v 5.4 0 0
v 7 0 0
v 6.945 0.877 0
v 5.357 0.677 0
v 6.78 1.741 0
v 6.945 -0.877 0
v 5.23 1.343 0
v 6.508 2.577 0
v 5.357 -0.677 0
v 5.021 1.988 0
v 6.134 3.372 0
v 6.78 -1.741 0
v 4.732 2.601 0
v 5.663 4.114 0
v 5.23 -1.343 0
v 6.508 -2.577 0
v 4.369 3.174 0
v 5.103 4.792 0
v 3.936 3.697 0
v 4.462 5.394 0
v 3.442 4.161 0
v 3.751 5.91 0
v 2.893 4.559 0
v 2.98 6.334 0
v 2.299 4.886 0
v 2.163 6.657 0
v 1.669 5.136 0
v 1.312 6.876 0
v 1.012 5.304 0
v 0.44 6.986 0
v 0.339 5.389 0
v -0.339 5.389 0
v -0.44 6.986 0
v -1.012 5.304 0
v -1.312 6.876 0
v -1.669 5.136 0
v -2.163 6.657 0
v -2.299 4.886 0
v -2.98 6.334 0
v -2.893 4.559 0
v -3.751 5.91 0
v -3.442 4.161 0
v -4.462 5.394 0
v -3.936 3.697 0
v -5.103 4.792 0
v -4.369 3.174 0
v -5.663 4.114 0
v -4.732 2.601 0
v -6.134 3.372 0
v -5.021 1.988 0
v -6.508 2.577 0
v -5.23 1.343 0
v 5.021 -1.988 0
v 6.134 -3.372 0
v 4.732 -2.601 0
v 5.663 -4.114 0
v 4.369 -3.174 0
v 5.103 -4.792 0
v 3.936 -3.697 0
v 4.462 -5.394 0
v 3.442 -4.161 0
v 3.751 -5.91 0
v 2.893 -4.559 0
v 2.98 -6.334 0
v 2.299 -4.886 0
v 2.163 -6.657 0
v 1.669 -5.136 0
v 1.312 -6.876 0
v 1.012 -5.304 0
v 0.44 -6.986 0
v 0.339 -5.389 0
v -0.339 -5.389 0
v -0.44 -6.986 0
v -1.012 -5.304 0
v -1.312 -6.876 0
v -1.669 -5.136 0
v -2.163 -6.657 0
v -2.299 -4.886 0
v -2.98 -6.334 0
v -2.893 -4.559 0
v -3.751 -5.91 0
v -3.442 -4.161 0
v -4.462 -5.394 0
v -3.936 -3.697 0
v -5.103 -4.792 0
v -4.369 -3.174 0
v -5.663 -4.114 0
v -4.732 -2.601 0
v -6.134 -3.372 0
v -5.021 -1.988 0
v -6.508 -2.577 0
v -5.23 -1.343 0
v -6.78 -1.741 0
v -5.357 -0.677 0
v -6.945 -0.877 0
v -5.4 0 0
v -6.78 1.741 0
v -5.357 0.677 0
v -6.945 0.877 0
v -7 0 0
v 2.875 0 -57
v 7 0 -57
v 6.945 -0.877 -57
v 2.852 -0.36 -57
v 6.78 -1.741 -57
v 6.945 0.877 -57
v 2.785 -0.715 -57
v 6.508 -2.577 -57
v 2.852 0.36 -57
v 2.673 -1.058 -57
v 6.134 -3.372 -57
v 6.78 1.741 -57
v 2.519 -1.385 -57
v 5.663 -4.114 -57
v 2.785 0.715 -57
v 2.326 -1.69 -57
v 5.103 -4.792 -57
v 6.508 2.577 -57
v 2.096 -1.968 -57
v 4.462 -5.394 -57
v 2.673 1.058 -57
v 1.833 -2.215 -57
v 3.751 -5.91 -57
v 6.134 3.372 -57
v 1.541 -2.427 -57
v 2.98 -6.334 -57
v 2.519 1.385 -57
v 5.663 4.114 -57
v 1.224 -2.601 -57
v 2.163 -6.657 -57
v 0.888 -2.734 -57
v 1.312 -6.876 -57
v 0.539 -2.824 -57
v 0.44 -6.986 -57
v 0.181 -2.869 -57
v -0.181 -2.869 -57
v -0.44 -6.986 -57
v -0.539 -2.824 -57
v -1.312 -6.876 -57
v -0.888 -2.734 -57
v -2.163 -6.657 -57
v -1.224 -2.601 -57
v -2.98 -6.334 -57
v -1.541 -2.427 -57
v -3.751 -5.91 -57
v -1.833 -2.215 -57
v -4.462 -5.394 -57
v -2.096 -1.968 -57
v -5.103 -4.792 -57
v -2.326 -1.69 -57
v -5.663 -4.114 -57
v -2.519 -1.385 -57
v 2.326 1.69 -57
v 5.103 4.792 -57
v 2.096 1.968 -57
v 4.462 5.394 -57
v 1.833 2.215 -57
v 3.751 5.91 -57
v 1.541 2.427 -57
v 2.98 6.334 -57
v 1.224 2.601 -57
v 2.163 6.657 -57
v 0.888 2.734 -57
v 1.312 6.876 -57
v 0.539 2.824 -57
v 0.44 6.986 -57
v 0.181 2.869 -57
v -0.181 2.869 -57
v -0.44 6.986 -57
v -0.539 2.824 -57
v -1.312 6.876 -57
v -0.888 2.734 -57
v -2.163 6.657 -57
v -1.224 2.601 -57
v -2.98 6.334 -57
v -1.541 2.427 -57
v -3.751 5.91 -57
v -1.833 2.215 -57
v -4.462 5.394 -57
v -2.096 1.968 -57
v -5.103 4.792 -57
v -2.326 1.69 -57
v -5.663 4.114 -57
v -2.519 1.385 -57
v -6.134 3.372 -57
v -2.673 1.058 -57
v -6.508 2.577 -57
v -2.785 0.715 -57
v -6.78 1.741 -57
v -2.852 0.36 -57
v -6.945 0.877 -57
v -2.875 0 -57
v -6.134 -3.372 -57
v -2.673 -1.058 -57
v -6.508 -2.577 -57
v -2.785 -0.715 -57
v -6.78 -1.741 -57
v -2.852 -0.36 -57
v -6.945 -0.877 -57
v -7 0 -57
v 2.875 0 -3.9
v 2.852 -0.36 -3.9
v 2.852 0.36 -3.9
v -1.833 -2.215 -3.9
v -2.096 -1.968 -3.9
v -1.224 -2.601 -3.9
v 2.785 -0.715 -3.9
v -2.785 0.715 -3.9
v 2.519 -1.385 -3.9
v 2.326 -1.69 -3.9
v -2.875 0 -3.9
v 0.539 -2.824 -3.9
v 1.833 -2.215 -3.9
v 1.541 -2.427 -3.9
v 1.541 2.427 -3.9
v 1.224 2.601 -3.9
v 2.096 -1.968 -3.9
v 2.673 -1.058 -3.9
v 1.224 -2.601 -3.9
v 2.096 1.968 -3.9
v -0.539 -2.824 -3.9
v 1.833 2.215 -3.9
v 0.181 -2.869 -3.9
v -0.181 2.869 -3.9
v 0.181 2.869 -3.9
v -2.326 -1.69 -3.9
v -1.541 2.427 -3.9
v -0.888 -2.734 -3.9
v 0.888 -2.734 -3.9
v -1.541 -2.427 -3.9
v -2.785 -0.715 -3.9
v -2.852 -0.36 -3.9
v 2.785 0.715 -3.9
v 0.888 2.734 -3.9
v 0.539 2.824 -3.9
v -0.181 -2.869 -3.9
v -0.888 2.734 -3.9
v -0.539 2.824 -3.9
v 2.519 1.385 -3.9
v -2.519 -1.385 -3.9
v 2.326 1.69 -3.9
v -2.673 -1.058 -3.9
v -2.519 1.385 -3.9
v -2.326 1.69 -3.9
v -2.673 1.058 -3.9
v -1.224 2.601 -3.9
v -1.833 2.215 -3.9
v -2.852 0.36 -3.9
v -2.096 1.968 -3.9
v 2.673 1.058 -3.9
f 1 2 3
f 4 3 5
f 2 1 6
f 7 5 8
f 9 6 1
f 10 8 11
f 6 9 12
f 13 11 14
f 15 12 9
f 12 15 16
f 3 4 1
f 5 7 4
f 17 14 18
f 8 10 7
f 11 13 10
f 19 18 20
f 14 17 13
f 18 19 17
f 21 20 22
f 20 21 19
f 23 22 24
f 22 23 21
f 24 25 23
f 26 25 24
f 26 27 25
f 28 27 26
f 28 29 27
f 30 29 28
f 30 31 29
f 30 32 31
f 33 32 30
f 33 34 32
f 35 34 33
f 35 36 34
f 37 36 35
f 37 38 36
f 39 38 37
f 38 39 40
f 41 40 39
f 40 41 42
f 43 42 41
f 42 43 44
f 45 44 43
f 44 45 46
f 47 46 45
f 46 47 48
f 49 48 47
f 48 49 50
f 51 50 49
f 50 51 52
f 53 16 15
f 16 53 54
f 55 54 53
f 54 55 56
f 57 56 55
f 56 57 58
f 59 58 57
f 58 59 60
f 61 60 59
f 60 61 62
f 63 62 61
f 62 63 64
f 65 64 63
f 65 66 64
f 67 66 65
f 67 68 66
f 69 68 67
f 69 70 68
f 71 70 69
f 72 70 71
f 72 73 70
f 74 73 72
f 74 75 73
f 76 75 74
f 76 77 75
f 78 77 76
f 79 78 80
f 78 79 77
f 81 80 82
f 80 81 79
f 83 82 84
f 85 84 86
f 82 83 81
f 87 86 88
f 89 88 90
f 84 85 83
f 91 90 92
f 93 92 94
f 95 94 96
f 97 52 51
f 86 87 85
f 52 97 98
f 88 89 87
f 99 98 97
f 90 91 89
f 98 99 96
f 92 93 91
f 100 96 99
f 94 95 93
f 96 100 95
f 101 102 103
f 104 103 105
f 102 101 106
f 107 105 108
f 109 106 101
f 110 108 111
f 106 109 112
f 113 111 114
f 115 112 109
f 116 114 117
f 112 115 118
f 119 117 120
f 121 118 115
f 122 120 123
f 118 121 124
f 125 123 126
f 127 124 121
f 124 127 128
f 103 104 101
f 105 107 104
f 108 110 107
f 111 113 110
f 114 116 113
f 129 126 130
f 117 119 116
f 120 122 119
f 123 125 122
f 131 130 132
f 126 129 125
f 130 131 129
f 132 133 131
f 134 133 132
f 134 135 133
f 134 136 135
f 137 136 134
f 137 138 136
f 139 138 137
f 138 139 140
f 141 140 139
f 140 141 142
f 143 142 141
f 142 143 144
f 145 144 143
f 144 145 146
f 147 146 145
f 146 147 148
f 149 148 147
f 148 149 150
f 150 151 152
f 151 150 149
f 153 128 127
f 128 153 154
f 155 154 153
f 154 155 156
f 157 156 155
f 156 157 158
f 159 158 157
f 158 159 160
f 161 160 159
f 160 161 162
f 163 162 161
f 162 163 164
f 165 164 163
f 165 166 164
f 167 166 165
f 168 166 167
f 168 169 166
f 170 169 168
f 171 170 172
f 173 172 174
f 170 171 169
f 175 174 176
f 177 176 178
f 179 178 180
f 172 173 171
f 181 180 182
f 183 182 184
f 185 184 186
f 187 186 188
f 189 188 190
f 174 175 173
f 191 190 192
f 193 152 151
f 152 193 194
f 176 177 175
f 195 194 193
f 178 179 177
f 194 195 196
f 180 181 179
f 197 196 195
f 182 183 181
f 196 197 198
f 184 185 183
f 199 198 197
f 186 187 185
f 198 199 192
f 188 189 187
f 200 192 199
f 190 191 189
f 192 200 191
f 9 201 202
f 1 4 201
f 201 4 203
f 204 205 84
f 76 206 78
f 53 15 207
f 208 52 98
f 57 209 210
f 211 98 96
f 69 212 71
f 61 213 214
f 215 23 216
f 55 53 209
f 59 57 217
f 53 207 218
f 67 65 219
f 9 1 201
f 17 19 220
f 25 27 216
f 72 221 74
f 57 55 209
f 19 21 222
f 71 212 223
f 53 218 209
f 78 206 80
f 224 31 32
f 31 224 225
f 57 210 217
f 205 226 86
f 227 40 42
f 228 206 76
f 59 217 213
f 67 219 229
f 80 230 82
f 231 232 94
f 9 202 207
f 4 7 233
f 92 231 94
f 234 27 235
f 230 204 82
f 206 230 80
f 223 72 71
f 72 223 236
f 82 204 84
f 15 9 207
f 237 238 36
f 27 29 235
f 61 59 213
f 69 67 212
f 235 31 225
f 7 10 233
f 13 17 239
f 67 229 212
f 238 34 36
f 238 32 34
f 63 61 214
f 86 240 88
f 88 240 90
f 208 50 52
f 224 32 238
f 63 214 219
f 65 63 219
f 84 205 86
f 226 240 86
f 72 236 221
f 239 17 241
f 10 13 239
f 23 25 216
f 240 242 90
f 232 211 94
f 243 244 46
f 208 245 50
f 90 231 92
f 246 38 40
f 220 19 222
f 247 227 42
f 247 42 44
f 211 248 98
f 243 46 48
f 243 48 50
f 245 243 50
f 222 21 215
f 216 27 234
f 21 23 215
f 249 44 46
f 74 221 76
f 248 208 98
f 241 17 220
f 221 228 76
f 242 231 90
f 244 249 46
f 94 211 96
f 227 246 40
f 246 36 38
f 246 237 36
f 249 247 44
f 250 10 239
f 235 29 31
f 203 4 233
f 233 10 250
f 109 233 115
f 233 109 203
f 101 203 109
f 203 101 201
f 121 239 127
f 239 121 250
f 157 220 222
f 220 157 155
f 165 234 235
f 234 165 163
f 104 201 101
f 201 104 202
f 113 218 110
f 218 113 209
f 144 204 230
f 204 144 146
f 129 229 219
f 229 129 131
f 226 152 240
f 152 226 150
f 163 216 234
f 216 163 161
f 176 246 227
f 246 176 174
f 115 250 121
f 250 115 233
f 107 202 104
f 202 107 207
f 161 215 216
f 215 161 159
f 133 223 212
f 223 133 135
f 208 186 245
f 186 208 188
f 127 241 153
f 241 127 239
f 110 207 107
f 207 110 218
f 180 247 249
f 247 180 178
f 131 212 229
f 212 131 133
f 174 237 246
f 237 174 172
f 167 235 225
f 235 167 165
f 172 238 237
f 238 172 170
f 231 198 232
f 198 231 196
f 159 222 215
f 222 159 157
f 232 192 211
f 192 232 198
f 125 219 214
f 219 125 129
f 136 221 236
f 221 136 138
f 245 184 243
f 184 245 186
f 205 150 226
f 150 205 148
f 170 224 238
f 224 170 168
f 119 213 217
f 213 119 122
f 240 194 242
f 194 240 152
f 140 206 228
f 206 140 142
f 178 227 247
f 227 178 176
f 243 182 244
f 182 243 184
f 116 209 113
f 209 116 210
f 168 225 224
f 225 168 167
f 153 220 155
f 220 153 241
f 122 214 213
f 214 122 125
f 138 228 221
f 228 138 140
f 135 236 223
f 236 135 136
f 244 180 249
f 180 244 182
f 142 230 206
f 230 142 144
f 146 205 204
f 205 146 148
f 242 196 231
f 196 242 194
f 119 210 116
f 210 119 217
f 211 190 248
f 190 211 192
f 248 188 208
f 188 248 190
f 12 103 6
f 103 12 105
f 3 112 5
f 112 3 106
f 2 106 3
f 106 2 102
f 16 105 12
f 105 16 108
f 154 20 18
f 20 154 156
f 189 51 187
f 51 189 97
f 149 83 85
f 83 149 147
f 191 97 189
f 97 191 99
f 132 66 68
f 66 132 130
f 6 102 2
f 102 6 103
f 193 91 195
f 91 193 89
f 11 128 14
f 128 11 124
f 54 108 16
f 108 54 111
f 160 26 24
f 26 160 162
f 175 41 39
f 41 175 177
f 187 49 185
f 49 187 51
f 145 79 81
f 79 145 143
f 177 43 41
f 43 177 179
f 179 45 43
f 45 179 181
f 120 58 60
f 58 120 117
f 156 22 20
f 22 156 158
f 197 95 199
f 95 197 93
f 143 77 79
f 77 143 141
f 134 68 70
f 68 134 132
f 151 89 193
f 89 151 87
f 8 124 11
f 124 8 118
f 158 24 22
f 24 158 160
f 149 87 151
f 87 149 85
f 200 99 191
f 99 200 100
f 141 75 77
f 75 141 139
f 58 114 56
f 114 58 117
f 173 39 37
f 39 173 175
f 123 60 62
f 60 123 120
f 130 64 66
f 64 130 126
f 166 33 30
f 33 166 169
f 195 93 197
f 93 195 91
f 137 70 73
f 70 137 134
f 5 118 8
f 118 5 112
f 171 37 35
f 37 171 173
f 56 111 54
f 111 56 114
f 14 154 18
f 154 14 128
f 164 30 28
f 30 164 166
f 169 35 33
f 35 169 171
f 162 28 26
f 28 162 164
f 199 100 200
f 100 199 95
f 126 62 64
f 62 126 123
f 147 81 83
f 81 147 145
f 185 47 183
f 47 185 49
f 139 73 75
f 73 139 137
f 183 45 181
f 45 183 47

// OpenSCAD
$fn = 50;


difference() {
	union() {
		translate(v = [0, 0, -57.0000000000]) {
			cylinder(h = 57, r = 7.0000000000);
		}
		cylinder(h = 0, r = 10.0000000000);
	}
	union() {
		translate(v = [0, 0, 0]) {
			rotate(a = [0, 0, 0]) {
				difference() {
					union() {
						#translate(v = [0, 0, -57.0000000000]) {
							cylinder(h = 57, r = 2.6000000000);
						}
						#translate(v = [0, 0, -3.9000000000]) {
							cylinder(h = 3.9000000000, r1 = 2.8750000000, r2 = 5.4000000000);
						}
						#translate(v = [0, 0, -57.0000000000]) {
							cylinder(h = 57, r = 2.8750000000);
						}
						#translate(v = [0, 0, -57.0000000000]) {
							cylinder(h = 57, r = 2.6000000000);
						}
					}
					union();
				}
			}
		}
	}
}
